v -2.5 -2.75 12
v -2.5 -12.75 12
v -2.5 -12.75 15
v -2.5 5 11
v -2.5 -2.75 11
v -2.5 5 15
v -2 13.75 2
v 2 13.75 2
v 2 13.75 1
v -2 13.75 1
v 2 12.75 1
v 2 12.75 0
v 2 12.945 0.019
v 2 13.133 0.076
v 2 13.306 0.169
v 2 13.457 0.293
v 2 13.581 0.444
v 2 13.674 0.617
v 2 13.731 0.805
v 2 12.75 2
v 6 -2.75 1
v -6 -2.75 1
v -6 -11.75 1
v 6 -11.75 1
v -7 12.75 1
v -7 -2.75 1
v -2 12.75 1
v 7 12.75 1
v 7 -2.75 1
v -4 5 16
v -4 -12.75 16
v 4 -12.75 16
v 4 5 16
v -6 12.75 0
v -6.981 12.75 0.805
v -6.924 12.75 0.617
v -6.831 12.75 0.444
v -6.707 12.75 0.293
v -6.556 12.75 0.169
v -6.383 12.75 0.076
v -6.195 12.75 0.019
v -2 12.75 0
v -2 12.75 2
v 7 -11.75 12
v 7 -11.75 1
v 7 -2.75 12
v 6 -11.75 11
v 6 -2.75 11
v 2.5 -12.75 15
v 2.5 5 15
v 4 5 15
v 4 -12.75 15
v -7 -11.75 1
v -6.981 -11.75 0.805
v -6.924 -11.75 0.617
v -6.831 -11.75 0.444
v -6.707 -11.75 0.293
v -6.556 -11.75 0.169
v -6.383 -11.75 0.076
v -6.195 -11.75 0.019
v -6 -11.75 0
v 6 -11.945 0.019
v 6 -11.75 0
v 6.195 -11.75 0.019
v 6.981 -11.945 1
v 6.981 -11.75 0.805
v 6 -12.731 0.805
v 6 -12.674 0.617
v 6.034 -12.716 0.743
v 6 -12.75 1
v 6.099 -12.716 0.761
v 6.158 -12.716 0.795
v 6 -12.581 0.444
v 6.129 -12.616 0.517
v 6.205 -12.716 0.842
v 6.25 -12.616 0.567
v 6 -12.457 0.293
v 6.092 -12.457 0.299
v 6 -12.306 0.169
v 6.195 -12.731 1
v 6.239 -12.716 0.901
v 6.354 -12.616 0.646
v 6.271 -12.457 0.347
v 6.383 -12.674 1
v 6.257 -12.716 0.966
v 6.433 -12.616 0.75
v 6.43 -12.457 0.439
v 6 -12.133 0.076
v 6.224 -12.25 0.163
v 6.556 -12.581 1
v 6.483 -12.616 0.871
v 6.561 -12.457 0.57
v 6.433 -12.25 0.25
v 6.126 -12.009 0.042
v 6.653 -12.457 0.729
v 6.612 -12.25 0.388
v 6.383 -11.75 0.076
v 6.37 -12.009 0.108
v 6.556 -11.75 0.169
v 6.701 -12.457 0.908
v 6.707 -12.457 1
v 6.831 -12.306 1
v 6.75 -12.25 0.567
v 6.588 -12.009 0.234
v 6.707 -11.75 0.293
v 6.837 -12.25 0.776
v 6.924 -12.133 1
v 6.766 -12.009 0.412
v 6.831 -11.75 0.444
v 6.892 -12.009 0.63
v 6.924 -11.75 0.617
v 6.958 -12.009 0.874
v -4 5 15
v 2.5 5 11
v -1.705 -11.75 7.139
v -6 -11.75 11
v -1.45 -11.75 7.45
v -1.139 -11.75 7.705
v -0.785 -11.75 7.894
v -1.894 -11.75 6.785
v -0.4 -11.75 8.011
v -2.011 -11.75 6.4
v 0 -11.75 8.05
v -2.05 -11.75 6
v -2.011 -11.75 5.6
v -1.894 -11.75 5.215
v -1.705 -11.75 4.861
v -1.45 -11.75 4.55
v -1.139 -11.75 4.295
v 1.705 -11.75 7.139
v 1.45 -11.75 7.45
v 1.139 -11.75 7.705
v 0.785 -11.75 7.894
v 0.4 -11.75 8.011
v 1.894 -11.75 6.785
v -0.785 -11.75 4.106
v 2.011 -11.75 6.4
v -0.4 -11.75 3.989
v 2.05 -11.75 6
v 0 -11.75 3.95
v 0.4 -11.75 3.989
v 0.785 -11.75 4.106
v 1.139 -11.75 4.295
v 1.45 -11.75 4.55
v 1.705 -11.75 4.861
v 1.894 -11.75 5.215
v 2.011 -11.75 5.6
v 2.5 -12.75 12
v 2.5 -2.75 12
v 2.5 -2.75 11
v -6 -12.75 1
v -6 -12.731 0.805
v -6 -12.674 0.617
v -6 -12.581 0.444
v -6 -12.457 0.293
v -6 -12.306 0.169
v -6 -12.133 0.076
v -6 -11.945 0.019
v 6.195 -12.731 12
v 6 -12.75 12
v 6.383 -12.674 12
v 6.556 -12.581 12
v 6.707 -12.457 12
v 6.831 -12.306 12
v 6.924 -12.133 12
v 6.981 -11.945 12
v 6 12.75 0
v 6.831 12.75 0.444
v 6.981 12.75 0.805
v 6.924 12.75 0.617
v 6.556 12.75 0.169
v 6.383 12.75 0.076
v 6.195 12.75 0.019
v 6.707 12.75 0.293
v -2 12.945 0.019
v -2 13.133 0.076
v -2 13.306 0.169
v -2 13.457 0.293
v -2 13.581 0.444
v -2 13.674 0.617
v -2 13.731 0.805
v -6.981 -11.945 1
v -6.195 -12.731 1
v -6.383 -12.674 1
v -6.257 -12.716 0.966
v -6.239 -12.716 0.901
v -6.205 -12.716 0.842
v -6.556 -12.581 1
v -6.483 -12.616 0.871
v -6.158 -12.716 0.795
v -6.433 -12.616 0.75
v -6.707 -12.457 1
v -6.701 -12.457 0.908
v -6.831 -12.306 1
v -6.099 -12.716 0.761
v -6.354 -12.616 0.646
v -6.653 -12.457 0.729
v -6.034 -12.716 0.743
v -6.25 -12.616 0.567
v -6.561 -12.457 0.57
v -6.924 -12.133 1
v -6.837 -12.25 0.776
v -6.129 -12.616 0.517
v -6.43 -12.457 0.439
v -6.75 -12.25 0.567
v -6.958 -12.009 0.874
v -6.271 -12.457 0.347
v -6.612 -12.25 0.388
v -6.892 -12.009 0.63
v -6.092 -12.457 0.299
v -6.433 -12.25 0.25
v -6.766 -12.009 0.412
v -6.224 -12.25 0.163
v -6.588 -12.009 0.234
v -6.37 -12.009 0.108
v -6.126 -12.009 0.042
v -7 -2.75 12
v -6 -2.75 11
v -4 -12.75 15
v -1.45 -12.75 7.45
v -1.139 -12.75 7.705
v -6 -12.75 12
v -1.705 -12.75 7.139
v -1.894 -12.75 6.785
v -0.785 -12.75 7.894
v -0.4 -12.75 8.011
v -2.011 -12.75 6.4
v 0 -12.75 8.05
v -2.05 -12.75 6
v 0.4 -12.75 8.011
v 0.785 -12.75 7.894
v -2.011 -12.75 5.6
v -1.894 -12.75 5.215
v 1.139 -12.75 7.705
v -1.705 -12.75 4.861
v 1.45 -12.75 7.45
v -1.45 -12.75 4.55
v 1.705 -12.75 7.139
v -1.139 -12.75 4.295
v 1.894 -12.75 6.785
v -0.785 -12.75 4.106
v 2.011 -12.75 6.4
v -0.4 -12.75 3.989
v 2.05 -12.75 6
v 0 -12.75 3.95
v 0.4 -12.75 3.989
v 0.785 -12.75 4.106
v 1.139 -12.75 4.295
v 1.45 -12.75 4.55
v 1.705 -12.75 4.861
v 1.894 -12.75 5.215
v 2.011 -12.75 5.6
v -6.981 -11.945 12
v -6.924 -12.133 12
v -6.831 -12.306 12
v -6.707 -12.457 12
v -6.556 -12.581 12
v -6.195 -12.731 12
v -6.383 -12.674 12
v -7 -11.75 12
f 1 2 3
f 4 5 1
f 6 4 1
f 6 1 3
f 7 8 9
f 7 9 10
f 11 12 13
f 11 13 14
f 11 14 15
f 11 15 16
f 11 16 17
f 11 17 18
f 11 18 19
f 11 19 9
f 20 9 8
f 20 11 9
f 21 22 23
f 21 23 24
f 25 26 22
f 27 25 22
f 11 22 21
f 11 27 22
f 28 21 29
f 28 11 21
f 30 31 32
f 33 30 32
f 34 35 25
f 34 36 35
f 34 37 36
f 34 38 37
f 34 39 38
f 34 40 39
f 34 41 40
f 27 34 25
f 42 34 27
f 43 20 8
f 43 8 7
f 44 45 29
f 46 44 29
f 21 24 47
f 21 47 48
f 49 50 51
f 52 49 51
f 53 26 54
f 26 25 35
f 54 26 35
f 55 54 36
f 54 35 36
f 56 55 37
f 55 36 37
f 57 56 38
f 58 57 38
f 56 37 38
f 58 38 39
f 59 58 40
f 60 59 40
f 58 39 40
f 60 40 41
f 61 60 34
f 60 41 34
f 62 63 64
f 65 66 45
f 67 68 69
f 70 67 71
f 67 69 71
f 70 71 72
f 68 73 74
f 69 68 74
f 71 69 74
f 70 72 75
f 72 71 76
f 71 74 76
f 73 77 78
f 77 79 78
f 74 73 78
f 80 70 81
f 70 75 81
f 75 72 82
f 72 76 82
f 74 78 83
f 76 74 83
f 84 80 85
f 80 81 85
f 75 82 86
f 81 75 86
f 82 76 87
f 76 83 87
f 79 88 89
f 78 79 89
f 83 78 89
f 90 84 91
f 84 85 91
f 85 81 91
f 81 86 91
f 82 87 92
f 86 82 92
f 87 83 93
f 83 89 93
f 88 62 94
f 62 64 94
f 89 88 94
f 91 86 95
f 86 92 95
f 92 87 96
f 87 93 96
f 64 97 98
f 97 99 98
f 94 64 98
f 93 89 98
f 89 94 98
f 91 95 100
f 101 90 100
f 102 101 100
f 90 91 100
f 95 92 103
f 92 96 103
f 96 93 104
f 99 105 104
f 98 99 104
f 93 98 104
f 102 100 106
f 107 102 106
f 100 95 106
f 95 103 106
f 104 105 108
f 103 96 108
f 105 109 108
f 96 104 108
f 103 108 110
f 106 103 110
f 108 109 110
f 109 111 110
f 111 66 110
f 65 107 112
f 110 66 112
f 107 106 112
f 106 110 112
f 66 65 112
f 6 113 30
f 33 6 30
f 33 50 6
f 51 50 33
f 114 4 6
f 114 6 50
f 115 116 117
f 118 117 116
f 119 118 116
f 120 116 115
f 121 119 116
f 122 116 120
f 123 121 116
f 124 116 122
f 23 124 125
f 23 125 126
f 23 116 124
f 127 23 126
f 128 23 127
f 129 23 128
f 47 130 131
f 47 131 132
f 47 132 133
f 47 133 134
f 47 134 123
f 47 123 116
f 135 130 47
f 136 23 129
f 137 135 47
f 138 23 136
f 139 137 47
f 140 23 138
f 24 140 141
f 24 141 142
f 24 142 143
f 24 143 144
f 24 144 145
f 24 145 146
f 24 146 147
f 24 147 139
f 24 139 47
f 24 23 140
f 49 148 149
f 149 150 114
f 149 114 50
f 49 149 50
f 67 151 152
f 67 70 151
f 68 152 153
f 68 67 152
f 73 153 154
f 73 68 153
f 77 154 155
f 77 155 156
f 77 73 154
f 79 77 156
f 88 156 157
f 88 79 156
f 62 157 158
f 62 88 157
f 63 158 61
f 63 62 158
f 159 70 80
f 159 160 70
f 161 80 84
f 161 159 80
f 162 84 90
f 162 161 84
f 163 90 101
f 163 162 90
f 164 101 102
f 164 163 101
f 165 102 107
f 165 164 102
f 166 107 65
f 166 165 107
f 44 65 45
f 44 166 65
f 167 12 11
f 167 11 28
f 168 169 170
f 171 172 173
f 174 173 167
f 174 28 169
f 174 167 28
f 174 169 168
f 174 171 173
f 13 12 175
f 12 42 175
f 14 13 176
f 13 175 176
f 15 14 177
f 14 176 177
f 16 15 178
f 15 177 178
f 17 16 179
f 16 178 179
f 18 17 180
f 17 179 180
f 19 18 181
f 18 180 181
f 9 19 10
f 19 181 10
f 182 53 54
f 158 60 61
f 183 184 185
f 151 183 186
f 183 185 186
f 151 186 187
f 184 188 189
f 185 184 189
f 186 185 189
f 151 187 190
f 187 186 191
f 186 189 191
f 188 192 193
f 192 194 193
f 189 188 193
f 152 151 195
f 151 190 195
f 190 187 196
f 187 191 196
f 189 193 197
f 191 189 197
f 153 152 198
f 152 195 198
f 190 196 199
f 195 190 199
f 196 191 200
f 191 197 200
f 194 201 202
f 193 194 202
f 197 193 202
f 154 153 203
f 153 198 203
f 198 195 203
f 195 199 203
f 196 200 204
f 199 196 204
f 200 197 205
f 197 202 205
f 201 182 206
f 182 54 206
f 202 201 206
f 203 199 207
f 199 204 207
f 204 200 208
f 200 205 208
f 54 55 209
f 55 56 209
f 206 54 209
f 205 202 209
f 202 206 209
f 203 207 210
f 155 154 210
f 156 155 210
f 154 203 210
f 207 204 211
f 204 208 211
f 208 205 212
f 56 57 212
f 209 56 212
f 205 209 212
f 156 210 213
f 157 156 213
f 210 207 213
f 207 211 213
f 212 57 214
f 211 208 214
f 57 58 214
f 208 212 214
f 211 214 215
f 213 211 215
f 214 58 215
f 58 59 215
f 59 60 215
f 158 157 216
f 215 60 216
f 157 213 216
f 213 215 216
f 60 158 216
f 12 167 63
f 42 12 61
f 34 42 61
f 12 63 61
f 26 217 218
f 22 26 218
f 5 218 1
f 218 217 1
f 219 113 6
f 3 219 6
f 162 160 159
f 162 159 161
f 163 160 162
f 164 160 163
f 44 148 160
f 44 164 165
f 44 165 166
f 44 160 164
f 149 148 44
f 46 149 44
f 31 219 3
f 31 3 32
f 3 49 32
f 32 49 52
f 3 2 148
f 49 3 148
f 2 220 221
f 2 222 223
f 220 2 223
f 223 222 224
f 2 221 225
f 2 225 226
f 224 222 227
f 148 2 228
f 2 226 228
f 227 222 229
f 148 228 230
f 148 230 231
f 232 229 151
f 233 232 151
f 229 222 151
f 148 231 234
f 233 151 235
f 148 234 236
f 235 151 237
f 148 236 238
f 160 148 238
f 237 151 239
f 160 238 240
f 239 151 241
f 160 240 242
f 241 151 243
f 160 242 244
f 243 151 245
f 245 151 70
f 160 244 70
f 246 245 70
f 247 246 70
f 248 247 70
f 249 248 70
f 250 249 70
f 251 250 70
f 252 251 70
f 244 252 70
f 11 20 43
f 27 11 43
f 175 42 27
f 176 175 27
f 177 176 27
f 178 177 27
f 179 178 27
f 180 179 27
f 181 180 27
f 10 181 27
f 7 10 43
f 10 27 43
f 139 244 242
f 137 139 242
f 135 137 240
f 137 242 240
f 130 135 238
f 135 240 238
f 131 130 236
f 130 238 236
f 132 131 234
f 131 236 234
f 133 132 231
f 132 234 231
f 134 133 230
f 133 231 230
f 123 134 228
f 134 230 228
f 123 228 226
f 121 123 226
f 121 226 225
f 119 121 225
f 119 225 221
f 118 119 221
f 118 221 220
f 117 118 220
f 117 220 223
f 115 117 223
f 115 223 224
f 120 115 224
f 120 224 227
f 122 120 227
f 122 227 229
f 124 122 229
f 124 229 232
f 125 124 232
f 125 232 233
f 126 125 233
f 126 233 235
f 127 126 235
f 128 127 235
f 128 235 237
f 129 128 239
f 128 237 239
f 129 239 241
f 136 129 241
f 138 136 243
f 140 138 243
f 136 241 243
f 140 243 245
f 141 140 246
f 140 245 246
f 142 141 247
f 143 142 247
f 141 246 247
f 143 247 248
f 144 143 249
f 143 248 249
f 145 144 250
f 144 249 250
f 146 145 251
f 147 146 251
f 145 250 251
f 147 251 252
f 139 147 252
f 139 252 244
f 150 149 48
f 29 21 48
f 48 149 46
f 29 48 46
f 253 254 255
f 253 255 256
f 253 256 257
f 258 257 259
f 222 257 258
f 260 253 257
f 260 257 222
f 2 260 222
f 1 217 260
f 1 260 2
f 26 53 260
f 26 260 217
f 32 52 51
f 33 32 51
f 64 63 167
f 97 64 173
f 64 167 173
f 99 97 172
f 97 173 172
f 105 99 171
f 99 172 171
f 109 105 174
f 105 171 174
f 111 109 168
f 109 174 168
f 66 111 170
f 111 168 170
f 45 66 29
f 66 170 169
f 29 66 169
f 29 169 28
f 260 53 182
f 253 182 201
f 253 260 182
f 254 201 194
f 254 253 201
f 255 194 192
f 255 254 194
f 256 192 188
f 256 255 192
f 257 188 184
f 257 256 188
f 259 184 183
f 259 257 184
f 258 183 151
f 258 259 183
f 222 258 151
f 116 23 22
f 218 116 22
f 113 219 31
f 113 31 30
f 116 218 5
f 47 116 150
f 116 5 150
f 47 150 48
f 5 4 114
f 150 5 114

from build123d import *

# Parameters (mm, degrees)
F0_W      = 14
F0_H      = 25.5
F1_DEPTH  = 12
F2_T      = -1
F3_R      = 2.05
F4_DEPTH  = 25
F5_W      = 5
F5_H      = 10
F6_DEPTH  = 3
F7_R      = 1
F8_W      = 5
F8_H      = 3
F9_DEPTH  = 7.75
F10_W     = 8
F10_H     = 17.75
F11_DEPTH = 1
F13_DEPTH = 11
F14_W     = 4
F14_H     = 2
F15_DEPTH = 1
F16_R     = 1


with BuildPart() as f1:
    # F0 (on Top) → F1 (new body)
    with BuildSketch(Plane.XY):
        Rectangle(F0_W, F0_H)
    extrude(amount=F1_DEPTH)

    # F2
    f2_openings = [f1.faces().sort_by_distance(p)[0] for p in [
        (0, 12.75, 6),
    ]]
    offset(amount=F2_T, openings=f2_openings)

    # F3 (on face) → F4 (cut)
    with BuildSketch(Plane.XZ.offset(12.75)):
        with Locations((0, 6)):
            Circle(F3_R)
    extrude(amount=-F4_DEPTH, mode=Mode.SUBTRACT)

    # F5 (on face) → F6 (join)
    with BuildSketch(Plane.XY.offset(12)):
        Rectangle(F5_W, F5_H)
    extrude(amount=F6_DEPTH)

    # F7
    f7_edges = [f1.edges().sort_by_distance(p)[0] for p in [
        (7, 0, 0),
        (-7, 0, 0),
        (-7, -12.75, 6),
        (0, -12.75, 0),
        (7, -12.75, 6),
    ]]
    fillet(f7_edges, radius=F7_R)

    # F8 (on face) → F9 (join)
    with BuildSketch(Plane.XZ.offset(5)):
        with Locations((0, 13.5)):
            Rectangle(F8_W, F8_H)
    extrude(amount=F9_DEPTH)

    # F10 (on face) → F11 (join)
    with BuildSketch(Plane.XY.offset(15)):
        with Locations((0, -3.875)):
            Rectangle(F10_W, F10_H)
    extrude(amount=F11_DEPTH)

    # F12 (on face) → F13 (cut)
    with BuildSketch(Plane.XY.offset(12)):
        Polygon((7, -2.75), (7, 12.75), (-7, 12.75), (-7, -2.75), (-2.5, -2.75), (-2.5, 5), (2.5, 5), (2.5, -2.75), align=None)
    extrude(amount=-F13_DEPTH, mode=Mode.SUBTRACT)

    # F14 (on face) → F15 (join)
    with BuildSketch(Plane(origin=(0, 12.75, 0), x_dir=(-1, 0, 0), z_dir=(0, 1, 0))):
        with Locations((0, 1)):
            Rectangle(F14_W, F14_H)
    extrude(amount=F15_DEPTH)

    # F16
    f16_edges = [f1.edges().sort_by_distance(p)[0] for p in [
        (0, 13.75, 0),
    ]]
    fillet(f16_edges, radius=F16_R)


solid = f1.part
